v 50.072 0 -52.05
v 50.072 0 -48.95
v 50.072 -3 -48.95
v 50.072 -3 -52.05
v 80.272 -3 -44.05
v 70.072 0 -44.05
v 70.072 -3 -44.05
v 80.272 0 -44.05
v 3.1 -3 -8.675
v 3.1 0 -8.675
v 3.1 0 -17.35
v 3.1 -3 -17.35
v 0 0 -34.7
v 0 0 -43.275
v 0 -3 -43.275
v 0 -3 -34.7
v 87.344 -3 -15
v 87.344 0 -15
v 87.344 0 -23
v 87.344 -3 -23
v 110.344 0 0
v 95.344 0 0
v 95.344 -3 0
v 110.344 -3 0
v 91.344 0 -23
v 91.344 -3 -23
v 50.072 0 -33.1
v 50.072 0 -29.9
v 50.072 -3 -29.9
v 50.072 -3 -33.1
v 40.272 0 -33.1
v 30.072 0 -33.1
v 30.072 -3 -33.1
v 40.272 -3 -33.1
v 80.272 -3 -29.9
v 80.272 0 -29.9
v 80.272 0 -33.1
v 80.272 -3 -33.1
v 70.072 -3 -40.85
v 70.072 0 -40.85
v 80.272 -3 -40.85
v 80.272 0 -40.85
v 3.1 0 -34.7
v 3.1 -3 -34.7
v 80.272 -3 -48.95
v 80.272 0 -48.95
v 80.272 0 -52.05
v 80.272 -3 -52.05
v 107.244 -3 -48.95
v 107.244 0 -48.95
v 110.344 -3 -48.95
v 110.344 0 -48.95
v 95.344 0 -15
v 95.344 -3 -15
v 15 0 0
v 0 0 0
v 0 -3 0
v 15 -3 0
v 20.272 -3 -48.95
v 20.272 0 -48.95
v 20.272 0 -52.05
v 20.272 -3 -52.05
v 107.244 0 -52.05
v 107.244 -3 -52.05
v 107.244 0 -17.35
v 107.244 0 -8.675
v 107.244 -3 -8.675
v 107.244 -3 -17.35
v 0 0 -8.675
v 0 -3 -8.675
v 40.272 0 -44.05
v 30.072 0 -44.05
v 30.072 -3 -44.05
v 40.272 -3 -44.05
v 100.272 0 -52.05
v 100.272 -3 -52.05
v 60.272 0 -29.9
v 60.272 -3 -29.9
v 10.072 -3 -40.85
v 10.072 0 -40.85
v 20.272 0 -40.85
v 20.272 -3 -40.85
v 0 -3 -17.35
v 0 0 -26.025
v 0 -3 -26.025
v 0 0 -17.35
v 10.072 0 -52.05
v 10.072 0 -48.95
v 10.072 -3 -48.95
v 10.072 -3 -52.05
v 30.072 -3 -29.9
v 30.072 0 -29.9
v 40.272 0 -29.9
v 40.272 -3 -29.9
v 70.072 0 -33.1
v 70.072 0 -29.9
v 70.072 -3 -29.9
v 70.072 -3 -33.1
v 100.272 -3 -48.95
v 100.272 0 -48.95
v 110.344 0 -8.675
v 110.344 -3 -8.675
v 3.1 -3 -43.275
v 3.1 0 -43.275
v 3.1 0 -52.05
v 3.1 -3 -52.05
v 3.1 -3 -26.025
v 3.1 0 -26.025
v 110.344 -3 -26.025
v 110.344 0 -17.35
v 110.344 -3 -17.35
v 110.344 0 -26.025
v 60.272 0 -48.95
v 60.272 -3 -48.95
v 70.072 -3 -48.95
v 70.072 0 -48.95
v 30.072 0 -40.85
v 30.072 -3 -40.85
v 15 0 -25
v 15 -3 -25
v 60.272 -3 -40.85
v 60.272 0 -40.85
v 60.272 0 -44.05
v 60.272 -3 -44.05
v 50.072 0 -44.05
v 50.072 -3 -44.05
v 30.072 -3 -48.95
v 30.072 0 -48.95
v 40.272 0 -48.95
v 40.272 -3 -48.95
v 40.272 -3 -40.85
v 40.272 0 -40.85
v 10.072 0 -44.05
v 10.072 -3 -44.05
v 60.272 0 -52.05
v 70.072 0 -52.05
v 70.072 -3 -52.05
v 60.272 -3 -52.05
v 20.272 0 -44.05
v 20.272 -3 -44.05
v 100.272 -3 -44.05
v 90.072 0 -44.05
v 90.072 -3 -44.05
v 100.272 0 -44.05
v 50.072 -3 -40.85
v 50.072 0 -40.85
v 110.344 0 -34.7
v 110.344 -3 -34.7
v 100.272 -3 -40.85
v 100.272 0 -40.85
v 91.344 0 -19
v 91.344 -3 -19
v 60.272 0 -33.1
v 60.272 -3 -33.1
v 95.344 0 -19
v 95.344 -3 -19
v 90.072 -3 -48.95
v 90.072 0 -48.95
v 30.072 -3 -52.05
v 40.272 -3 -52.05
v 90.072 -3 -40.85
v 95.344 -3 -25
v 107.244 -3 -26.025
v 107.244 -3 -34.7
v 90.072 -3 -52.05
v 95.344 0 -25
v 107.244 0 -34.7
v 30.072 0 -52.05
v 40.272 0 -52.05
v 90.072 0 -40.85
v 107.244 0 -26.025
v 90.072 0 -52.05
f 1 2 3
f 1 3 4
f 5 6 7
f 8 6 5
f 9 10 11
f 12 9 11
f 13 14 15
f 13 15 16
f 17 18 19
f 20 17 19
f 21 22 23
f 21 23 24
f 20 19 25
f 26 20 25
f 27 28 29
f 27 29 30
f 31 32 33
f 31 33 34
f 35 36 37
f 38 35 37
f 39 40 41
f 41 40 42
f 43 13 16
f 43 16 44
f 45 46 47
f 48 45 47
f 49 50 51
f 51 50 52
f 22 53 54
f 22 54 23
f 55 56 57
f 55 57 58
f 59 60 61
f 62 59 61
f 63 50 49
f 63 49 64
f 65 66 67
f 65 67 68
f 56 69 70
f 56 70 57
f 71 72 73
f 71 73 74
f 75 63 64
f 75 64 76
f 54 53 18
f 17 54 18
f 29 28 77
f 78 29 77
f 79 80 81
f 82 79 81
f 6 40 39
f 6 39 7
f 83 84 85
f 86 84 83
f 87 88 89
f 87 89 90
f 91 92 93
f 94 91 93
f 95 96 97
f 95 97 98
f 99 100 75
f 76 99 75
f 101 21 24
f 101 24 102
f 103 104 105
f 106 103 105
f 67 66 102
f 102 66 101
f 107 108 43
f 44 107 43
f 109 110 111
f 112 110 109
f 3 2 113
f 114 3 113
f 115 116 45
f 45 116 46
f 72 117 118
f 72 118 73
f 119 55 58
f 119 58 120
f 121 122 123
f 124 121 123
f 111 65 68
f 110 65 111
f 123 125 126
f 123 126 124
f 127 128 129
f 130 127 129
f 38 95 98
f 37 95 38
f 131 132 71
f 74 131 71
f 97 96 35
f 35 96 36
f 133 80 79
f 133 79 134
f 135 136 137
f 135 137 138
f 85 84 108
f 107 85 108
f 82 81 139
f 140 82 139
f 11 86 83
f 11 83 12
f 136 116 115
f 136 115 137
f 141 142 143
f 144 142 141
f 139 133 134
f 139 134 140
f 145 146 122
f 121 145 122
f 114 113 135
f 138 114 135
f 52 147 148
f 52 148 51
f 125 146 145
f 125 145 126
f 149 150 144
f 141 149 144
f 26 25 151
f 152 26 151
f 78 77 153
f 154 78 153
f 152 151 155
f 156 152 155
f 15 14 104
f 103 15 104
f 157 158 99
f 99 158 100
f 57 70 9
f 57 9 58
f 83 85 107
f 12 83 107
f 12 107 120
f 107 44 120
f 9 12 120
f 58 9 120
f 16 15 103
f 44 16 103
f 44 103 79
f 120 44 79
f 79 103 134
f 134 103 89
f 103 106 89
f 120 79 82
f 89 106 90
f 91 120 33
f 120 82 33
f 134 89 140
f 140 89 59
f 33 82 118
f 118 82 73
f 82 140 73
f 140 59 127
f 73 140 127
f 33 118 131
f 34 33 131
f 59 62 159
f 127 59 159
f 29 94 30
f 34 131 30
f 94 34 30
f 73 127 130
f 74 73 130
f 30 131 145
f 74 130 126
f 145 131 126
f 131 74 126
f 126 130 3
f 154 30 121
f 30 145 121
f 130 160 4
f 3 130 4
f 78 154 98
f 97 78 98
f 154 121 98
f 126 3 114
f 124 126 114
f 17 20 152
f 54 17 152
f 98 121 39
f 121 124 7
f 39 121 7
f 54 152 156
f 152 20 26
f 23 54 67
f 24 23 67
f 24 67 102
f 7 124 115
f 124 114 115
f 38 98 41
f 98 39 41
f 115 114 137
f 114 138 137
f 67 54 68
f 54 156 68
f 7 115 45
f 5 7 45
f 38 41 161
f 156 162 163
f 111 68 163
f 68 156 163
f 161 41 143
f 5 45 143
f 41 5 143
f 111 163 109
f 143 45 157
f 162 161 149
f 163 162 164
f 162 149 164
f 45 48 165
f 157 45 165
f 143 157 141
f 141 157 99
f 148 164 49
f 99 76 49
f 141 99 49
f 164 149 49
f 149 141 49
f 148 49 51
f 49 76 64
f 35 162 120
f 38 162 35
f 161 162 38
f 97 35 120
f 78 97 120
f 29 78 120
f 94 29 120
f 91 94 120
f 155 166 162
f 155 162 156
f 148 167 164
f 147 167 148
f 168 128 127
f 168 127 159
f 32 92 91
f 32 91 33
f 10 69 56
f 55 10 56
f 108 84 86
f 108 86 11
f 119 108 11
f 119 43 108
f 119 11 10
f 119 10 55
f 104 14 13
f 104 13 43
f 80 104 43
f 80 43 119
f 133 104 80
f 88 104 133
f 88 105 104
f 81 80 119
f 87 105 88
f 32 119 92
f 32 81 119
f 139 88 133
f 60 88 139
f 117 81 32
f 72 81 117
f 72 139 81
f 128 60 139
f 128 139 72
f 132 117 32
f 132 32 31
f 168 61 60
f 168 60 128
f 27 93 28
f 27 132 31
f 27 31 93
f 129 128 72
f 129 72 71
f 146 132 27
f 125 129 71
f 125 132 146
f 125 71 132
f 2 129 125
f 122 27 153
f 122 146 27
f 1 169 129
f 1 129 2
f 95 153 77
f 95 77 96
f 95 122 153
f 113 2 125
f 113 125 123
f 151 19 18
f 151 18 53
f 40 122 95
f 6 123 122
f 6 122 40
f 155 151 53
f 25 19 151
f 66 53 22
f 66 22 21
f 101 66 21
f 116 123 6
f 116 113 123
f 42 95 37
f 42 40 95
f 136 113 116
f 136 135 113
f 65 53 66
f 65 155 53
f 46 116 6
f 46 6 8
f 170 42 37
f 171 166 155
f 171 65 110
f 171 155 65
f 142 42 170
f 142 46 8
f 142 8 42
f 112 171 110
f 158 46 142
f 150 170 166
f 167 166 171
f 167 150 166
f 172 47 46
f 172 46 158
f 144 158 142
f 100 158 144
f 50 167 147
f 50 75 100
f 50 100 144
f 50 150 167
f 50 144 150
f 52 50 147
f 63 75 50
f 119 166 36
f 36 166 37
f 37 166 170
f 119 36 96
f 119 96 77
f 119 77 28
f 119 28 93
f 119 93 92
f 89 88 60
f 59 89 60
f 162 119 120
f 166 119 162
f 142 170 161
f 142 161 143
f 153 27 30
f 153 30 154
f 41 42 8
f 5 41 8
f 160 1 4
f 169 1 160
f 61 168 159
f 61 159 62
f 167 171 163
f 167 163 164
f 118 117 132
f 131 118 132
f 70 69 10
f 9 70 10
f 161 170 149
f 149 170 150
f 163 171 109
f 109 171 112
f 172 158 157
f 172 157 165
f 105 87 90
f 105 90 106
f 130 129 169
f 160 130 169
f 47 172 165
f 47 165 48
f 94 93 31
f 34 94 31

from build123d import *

# Parameters (mm, degrees)
BOSS_EXTRUDE1_DEPTH = 3
SKETCH3_W           = 3.2
SKETCH3_H           = 8.875
SKETCH3_H_2         = 8.675
SKETCH3_H_3         = 3.2
SKETCH3_W_2         = 10.2
CUT_EXTRUDE1_DEPTH  = 4
BOSS_EXTRUDE2_DEPTH = 3


with BuildPart() as part:
    # Sketch1 → Boss-Extrude1 (new body)
    with BuildSketch(Plane(origin=(0, 0, 0), x_dir=(1, 0, 0), z_dir=(0, 1, 0))):
        Polygon((15, 0), (15, 25), (95.344434203, 25), (95.344434203, 0), (110.344434203, 0), (110.344434203, 52.05), (0, 52.05), (0, 0), align=None)
    extrude(amount=-BOSS_EXTRUDE1_DEPTH)

    # Sketch3 → Cut-Extrude1 (cut, through all)
    with BuildSketch(Plane(origin=(0, 0, 0), x_dir=(1, 0, 0), z_dir=(0, 1, 0))):
        with Locations((1.5, 47.7125)):
            Rectangle(SKETCH3_W, SKETCH3_H)
        with Locations((1.5, 30.3625)):
            Rectangle(SKETCH3_W, SKETCH3_H_2)
        with Locations((1.5, 13.0125)):
            Rectangle(SKETCH3_W, SKETCH3_H_2)
        with Locations((108.844434203, 50.55)):
            Rectangle(SKETCH3_W, SKETCH3_H_3)
        with Locations((55.172217102, 50.55)):
            Rectangle(SKETCH3_W_2, SKETCH3_H_3)
        with Locations((55.172217102, 42.45)):
            Rectangle(SKETCH3_W_2, SKETCH3_H_3)
        with Locations((55.172217102, 31.5)):
            Rectangle(SKETCH3_W_2, SKETCH3_H_3)
        with Locations((35.172217102, 50.55)):
            Rectangle(SKETCH3_W_2, SKETCH3_H_3)
        with Locations((35.172217102, 42.45)):
            Rectangle(SKETCH3_W_2, SKETCH3_H_3)
        with Locations((35.172217102, 31.5)):
            Rectangle(SKETCH3_W_2, SKETCH3_H_3)
        with Locations((15.172217102, 50.55)):
            Rectangle(SKETCH3_W_2, SKETCH3_H_3)
        with Locations((15.172217102, 42.45)):
            Rectangle(SKETCH3_W_2, SKETCH3_H_3)
        with Locations((108.844434203, 13.0125)):
            Rectangle(SKETCH3_W, SKETCH3_H_2)
        with Locations((108.844434203, 30.3625)):
            Rectangle(SKETCH3_W, SKETCH3_H_2)
        with Locations((95.172217102, 50.55)):
            Rectangle(SKETCH3_W_2, SKETCH3_H_3)
        with Locations((95.172217102, 42.45)):
            Rectangle(SKETCH3_W_2, SKETCH3_H_3)
        with Locations((75.172217102, 31.5)):
            Rectangle(SKETCH3_W_2, SKETCH3_H_3)
        with Locations((75.172217102, 42.45)):
            Rectangle(SKETCH3_W_2, SKETCH3_H_3)
        with Locations((75.172217102, 50.55)):
            Rectangle(SKETCH3_W_2, SKETCH3_H_3)
    extrude(amount=-CUT_EXTRUDE1_DEPTH, mode=Mode.SUBTRACT)

    # Sketch4 → Boss-Extrude2 (add)
    with BuildSketch(Plane(origin=(0, 0, 0), x_dir=(1, 0, 0), z_dir=(0, 1, 0))):
        Polygon((95.344434203, 15), (87.344434203, 15), (87.344434203, 23), (91.344434203, 23), (91.344434203, 19), (95.344434203, 19), align=None)
    extrude(amount=-BOSS_EXTRUDE2_DEPTH)


solid = part.part
